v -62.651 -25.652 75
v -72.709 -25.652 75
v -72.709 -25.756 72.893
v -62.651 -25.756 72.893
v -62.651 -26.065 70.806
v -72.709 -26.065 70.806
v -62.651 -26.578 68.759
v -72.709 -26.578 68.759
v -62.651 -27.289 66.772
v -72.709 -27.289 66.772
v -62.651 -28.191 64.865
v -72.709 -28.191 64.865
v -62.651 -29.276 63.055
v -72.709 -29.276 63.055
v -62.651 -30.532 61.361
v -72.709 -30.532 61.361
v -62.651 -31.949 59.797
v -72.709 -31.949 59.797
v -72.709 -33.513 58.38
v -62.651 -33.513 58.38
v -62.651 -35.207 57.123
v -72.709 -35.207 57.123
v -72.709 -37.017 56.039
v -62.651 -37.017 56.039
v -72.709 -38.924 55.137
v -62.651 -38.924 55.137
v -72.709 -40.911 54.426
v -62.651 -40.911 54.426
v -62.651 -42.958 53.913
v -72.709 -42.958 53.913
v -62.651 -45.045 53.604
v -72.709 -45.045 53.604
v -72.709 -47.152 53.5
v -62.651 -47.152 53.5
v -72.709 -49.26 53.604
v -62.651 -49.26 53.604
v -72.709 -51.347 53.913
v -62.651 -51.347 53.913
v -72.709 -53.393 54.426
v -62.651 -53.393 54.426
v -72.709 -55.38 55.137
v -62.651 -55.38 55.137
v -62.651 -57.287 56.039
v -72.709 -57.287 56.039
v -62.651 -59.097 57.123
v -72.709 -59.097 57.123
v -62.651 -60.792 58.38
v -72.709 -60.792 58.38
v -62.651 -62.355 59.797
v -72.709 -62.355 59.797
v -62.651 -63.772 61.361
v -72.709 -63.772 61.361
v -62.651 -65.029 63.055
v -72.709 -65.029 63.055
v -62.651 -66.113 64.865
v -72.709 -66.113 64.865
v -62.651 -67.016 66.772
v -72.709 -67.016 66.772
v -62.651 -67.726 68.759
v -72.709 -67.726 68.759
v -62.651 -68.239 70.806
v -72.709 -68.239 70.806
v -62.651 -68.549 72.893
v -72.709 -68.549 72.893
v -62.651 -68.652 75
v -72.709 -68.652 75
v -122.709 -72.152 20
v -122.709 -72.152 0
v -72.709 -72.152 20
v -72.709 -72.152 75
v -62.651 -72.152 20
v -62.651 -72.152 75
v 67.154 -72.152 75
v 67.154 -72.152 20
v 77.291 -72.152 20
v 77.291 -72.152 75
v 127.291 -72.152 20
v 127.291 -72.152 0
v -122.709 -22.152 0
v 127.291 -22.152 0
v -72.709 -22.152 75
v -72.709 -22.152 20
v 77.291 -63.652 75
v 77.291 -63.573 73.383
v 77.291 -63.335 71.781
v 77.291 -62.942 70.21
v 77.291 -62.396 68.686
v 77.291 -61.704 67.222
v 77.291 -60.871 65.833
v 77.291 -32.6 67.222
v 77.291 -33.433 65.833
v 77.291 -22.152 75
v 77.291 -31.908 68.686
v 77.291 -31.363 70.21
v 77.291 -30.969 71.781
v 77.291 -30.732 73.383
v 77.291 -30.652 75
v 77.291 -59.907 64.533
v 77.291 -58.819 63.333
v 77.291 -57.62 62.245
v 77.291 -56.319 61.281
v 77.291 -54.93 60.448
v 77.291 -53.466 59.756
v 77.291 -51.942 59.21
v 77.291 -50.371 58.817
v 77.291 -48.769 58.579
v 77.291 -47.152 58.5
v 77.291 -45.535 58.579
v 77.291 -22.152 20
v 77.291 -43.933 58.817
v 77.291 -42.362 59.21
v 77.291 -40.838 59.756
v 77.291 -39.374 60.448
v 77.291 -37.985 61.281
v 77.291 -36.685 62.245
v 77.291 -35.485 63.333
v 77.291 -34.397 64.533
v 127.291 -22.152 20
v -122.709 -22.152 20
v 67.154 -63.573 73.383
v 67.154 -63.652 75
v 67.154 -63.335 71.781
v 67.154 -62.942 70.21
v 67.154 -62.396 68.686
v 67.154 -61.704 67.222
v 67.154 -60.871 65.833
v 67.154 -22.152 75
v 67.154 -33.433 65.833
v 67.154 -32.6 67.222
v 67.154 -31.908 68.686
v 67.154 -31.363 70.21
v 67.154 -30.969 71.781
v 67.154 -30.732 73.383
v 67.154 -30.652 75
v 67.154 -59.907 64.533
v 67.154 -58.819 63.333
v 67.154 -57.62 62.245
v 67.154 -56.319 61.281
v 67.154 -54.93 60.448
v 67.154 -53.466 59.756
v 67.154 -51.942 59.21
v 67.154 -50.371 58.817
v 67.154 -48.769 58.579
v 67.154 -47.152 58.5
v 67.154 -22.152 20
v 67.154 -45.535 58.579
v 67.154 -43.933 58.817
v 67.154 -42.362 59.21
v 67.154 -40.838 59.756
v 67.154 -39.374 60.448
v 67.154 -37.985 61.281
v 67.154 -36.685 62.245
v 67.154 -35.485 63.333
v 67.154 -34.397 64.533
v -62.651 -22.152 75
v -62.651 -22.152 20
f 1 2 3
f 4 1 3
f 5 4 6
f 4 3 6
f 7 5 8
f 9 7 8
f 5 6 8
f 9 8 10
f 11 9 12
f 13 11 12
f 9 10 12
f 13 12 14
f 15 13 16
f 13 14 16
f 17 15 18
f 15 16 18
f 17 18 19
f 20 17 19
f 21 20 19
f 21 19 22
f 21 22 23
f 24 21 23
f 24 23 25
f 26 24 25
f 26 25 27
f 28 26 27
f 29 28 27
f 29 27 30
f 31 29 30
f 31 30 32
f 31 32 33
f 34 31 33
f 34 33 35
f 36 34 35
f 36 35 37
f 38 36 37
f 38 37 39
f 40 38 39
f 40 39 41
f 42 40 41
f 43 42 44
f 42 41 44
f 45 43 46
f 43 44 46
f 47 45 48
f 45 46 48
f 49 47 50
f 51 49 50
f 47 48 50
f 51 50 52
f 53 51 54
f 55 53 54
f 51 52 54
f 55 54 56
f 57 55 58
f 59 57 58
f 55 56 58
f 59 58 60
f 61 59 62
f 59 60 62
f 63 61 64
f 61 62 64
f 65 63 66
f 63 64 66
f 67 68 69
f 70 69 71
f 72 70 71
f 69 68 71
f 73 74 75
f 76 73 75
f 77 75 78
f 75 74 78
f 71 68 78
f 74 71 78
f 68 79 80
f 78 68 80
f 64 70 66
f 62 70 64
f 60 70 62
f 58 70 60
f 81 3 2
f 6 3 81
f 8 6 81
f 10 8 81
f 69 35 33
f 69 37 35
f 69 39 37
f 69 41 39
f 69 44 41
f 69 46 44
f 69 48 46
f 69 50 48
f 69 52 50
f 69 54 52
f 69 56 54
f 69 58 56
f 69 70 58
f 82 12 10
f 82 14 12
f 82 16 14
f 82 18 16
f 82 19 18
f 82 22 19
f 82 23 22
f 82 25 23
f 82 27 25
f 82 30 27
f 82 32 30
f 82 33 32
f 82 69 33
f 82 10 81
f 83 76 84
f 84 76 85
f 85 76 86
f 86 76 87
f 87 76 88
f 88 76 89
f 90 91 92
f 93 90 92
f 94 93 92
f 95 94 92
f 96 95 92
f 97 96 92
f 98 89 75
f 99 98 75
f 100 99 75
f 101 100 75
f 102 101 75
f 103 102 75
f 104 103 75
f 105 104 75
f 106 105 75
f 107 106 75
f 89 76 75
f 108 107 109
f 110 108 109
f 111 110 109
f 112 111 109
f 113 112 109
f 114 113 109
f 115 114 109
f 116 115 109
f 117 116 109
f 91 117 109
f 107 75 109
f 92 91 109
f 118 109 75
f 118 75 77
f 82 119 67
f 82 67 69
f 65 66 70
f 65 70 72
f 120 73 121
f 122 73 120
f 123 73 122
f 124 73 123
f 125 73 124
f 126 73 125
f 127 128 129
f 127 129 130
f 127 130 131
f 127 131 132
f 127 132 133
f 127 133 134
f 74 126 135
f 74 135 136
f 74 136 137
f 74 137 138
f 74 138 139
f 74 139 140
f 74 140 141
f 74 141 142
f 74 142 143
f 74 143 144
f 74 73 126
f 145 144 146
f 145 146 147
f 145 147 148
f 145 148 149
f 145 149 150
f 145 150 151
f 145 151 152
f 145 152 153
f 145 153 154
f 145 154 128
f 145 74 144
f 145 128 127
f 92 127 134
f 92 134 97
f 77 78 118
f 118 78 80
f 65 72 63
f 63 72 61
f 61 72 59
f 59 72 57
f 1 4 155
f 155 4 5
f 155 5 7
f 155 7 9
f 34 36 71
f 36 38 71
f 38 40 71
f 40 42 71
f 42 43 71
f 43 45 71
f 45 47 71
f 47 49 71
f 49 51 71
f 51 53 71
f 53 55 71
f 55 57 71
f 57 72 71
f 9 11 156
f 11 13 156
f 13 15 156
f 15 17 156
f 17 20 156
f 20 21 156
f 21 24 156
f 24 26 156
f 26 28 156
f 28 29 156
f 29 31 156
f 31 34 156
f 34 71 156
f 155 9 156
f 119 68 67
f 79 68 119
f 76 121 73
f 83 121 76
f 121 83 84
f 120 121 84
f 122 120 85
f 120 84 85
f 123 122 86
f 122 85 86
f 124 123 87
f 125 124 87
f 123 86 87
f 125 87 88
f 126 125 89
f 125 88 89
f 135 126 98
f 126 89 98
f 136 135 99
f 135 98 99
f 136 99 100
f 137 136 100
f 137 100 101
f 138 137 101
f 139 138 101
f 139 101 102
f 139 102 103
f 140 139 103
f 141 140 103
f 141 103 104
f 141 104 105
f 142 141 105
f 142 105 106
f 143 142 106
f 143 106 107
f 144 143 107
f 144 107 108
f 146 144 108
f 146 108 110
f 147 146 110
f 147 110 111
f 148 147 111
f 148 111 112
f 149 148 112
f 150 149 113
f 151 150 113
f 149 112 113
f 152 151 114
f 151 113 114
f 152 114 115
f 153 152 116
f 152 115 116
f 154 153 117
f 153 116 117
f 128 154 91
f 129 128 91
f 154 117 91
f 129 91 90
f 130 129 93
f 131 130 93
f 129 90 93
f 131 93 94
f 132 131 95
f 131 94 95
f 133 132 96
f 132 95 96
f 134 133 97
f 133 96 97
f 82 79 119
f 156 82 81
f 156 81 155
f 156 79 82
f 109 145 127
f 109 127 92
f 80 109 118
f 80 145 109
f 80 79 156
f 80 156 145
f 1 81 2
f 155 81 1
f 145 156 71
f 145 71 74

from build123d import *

# Parameters (mm, degrees)
F0_W      = 250
F0_H      = 50
F1_DEPTH  = 20
F2_W      = 10.137797147
F2_H      = 50
F3_DEPTH  = 55
F5_DEPTH  = 200.001
F6_W      = 12.0579496026
F6_H      = 50
F7_DEPTH  = 55
F9_DEPTH  = 12.0579496026
F10_DEPTH = 2


with BuildPart() as f1:
    # F0 (on Top) → F1 (new body)
    with BuildSketch(Plane.XY):
        with Locations((2.2913627326, -47.1521499132)):
            Rectangle(F0_W, F0_H)
    extrude(amount=F1_DEPTH)

    # F2 (on face) → F3 (join)
    with BuildSketch(Plane.XY.offset(20)):
        with Locations((72.2224641591, -47.1521499132)):
            Rectangle(F2_W, F2_H)
    extrude(amount=F3_DEPTH)

    # F4 (on face) → F5 (cut, through all)
    with BuildSketch(Plane.YZ.offset(77.2913627326)):
        with BuildLine():
            ThreePointArc((-63.6521499132, 75), (-47.1521499132, 58.5), (-30.6521499132, 75))
            Line((-30.6521499132, 75), (-63.6521499132, 75))
        make_face()
    extrude(amount=-F5_DEPTH, mode=Mode.SUBTRACT)

    # F6 (on face) → F7 (join, through all)
    with BuildSketch(Plane.XY.offset(20)):
        with Locations((-66.679662466, -47.1521499132)):
            Rectangle(F6_W, F6_H)
    extrude(amount=F7_DEPTH)

    # F8 (on face) → F9 (cut, through all)
    with BuildSketch(Plane(origin=(-72.7086372674, 0, 0), x_dir=(0, -1, 0), z_dir=(-1, 0, 0))):
        with BuildLine():
            ThreePointArc((25.6521499132, 75), (47.1521499132, 53.5), (68.6521499132, 75))
            Line((68.6521499132, 75), (25.6521499132, 75))
        make_face()
    extrude(amount=-F9_DEPTH, mode=Mode.SUBTRACT)

    # F10 (cut): a face of the model
    f10_faces = [f1.faces().sort_by_distance(p)[0] for p in [
        (-60.6506876647, -47.1521499132, 40.9076845732),
    ]]
    extrude(f10_faces, amount=-F10_DEPTH, mode=Mode.SUBTRACT)


solid = f1.part
